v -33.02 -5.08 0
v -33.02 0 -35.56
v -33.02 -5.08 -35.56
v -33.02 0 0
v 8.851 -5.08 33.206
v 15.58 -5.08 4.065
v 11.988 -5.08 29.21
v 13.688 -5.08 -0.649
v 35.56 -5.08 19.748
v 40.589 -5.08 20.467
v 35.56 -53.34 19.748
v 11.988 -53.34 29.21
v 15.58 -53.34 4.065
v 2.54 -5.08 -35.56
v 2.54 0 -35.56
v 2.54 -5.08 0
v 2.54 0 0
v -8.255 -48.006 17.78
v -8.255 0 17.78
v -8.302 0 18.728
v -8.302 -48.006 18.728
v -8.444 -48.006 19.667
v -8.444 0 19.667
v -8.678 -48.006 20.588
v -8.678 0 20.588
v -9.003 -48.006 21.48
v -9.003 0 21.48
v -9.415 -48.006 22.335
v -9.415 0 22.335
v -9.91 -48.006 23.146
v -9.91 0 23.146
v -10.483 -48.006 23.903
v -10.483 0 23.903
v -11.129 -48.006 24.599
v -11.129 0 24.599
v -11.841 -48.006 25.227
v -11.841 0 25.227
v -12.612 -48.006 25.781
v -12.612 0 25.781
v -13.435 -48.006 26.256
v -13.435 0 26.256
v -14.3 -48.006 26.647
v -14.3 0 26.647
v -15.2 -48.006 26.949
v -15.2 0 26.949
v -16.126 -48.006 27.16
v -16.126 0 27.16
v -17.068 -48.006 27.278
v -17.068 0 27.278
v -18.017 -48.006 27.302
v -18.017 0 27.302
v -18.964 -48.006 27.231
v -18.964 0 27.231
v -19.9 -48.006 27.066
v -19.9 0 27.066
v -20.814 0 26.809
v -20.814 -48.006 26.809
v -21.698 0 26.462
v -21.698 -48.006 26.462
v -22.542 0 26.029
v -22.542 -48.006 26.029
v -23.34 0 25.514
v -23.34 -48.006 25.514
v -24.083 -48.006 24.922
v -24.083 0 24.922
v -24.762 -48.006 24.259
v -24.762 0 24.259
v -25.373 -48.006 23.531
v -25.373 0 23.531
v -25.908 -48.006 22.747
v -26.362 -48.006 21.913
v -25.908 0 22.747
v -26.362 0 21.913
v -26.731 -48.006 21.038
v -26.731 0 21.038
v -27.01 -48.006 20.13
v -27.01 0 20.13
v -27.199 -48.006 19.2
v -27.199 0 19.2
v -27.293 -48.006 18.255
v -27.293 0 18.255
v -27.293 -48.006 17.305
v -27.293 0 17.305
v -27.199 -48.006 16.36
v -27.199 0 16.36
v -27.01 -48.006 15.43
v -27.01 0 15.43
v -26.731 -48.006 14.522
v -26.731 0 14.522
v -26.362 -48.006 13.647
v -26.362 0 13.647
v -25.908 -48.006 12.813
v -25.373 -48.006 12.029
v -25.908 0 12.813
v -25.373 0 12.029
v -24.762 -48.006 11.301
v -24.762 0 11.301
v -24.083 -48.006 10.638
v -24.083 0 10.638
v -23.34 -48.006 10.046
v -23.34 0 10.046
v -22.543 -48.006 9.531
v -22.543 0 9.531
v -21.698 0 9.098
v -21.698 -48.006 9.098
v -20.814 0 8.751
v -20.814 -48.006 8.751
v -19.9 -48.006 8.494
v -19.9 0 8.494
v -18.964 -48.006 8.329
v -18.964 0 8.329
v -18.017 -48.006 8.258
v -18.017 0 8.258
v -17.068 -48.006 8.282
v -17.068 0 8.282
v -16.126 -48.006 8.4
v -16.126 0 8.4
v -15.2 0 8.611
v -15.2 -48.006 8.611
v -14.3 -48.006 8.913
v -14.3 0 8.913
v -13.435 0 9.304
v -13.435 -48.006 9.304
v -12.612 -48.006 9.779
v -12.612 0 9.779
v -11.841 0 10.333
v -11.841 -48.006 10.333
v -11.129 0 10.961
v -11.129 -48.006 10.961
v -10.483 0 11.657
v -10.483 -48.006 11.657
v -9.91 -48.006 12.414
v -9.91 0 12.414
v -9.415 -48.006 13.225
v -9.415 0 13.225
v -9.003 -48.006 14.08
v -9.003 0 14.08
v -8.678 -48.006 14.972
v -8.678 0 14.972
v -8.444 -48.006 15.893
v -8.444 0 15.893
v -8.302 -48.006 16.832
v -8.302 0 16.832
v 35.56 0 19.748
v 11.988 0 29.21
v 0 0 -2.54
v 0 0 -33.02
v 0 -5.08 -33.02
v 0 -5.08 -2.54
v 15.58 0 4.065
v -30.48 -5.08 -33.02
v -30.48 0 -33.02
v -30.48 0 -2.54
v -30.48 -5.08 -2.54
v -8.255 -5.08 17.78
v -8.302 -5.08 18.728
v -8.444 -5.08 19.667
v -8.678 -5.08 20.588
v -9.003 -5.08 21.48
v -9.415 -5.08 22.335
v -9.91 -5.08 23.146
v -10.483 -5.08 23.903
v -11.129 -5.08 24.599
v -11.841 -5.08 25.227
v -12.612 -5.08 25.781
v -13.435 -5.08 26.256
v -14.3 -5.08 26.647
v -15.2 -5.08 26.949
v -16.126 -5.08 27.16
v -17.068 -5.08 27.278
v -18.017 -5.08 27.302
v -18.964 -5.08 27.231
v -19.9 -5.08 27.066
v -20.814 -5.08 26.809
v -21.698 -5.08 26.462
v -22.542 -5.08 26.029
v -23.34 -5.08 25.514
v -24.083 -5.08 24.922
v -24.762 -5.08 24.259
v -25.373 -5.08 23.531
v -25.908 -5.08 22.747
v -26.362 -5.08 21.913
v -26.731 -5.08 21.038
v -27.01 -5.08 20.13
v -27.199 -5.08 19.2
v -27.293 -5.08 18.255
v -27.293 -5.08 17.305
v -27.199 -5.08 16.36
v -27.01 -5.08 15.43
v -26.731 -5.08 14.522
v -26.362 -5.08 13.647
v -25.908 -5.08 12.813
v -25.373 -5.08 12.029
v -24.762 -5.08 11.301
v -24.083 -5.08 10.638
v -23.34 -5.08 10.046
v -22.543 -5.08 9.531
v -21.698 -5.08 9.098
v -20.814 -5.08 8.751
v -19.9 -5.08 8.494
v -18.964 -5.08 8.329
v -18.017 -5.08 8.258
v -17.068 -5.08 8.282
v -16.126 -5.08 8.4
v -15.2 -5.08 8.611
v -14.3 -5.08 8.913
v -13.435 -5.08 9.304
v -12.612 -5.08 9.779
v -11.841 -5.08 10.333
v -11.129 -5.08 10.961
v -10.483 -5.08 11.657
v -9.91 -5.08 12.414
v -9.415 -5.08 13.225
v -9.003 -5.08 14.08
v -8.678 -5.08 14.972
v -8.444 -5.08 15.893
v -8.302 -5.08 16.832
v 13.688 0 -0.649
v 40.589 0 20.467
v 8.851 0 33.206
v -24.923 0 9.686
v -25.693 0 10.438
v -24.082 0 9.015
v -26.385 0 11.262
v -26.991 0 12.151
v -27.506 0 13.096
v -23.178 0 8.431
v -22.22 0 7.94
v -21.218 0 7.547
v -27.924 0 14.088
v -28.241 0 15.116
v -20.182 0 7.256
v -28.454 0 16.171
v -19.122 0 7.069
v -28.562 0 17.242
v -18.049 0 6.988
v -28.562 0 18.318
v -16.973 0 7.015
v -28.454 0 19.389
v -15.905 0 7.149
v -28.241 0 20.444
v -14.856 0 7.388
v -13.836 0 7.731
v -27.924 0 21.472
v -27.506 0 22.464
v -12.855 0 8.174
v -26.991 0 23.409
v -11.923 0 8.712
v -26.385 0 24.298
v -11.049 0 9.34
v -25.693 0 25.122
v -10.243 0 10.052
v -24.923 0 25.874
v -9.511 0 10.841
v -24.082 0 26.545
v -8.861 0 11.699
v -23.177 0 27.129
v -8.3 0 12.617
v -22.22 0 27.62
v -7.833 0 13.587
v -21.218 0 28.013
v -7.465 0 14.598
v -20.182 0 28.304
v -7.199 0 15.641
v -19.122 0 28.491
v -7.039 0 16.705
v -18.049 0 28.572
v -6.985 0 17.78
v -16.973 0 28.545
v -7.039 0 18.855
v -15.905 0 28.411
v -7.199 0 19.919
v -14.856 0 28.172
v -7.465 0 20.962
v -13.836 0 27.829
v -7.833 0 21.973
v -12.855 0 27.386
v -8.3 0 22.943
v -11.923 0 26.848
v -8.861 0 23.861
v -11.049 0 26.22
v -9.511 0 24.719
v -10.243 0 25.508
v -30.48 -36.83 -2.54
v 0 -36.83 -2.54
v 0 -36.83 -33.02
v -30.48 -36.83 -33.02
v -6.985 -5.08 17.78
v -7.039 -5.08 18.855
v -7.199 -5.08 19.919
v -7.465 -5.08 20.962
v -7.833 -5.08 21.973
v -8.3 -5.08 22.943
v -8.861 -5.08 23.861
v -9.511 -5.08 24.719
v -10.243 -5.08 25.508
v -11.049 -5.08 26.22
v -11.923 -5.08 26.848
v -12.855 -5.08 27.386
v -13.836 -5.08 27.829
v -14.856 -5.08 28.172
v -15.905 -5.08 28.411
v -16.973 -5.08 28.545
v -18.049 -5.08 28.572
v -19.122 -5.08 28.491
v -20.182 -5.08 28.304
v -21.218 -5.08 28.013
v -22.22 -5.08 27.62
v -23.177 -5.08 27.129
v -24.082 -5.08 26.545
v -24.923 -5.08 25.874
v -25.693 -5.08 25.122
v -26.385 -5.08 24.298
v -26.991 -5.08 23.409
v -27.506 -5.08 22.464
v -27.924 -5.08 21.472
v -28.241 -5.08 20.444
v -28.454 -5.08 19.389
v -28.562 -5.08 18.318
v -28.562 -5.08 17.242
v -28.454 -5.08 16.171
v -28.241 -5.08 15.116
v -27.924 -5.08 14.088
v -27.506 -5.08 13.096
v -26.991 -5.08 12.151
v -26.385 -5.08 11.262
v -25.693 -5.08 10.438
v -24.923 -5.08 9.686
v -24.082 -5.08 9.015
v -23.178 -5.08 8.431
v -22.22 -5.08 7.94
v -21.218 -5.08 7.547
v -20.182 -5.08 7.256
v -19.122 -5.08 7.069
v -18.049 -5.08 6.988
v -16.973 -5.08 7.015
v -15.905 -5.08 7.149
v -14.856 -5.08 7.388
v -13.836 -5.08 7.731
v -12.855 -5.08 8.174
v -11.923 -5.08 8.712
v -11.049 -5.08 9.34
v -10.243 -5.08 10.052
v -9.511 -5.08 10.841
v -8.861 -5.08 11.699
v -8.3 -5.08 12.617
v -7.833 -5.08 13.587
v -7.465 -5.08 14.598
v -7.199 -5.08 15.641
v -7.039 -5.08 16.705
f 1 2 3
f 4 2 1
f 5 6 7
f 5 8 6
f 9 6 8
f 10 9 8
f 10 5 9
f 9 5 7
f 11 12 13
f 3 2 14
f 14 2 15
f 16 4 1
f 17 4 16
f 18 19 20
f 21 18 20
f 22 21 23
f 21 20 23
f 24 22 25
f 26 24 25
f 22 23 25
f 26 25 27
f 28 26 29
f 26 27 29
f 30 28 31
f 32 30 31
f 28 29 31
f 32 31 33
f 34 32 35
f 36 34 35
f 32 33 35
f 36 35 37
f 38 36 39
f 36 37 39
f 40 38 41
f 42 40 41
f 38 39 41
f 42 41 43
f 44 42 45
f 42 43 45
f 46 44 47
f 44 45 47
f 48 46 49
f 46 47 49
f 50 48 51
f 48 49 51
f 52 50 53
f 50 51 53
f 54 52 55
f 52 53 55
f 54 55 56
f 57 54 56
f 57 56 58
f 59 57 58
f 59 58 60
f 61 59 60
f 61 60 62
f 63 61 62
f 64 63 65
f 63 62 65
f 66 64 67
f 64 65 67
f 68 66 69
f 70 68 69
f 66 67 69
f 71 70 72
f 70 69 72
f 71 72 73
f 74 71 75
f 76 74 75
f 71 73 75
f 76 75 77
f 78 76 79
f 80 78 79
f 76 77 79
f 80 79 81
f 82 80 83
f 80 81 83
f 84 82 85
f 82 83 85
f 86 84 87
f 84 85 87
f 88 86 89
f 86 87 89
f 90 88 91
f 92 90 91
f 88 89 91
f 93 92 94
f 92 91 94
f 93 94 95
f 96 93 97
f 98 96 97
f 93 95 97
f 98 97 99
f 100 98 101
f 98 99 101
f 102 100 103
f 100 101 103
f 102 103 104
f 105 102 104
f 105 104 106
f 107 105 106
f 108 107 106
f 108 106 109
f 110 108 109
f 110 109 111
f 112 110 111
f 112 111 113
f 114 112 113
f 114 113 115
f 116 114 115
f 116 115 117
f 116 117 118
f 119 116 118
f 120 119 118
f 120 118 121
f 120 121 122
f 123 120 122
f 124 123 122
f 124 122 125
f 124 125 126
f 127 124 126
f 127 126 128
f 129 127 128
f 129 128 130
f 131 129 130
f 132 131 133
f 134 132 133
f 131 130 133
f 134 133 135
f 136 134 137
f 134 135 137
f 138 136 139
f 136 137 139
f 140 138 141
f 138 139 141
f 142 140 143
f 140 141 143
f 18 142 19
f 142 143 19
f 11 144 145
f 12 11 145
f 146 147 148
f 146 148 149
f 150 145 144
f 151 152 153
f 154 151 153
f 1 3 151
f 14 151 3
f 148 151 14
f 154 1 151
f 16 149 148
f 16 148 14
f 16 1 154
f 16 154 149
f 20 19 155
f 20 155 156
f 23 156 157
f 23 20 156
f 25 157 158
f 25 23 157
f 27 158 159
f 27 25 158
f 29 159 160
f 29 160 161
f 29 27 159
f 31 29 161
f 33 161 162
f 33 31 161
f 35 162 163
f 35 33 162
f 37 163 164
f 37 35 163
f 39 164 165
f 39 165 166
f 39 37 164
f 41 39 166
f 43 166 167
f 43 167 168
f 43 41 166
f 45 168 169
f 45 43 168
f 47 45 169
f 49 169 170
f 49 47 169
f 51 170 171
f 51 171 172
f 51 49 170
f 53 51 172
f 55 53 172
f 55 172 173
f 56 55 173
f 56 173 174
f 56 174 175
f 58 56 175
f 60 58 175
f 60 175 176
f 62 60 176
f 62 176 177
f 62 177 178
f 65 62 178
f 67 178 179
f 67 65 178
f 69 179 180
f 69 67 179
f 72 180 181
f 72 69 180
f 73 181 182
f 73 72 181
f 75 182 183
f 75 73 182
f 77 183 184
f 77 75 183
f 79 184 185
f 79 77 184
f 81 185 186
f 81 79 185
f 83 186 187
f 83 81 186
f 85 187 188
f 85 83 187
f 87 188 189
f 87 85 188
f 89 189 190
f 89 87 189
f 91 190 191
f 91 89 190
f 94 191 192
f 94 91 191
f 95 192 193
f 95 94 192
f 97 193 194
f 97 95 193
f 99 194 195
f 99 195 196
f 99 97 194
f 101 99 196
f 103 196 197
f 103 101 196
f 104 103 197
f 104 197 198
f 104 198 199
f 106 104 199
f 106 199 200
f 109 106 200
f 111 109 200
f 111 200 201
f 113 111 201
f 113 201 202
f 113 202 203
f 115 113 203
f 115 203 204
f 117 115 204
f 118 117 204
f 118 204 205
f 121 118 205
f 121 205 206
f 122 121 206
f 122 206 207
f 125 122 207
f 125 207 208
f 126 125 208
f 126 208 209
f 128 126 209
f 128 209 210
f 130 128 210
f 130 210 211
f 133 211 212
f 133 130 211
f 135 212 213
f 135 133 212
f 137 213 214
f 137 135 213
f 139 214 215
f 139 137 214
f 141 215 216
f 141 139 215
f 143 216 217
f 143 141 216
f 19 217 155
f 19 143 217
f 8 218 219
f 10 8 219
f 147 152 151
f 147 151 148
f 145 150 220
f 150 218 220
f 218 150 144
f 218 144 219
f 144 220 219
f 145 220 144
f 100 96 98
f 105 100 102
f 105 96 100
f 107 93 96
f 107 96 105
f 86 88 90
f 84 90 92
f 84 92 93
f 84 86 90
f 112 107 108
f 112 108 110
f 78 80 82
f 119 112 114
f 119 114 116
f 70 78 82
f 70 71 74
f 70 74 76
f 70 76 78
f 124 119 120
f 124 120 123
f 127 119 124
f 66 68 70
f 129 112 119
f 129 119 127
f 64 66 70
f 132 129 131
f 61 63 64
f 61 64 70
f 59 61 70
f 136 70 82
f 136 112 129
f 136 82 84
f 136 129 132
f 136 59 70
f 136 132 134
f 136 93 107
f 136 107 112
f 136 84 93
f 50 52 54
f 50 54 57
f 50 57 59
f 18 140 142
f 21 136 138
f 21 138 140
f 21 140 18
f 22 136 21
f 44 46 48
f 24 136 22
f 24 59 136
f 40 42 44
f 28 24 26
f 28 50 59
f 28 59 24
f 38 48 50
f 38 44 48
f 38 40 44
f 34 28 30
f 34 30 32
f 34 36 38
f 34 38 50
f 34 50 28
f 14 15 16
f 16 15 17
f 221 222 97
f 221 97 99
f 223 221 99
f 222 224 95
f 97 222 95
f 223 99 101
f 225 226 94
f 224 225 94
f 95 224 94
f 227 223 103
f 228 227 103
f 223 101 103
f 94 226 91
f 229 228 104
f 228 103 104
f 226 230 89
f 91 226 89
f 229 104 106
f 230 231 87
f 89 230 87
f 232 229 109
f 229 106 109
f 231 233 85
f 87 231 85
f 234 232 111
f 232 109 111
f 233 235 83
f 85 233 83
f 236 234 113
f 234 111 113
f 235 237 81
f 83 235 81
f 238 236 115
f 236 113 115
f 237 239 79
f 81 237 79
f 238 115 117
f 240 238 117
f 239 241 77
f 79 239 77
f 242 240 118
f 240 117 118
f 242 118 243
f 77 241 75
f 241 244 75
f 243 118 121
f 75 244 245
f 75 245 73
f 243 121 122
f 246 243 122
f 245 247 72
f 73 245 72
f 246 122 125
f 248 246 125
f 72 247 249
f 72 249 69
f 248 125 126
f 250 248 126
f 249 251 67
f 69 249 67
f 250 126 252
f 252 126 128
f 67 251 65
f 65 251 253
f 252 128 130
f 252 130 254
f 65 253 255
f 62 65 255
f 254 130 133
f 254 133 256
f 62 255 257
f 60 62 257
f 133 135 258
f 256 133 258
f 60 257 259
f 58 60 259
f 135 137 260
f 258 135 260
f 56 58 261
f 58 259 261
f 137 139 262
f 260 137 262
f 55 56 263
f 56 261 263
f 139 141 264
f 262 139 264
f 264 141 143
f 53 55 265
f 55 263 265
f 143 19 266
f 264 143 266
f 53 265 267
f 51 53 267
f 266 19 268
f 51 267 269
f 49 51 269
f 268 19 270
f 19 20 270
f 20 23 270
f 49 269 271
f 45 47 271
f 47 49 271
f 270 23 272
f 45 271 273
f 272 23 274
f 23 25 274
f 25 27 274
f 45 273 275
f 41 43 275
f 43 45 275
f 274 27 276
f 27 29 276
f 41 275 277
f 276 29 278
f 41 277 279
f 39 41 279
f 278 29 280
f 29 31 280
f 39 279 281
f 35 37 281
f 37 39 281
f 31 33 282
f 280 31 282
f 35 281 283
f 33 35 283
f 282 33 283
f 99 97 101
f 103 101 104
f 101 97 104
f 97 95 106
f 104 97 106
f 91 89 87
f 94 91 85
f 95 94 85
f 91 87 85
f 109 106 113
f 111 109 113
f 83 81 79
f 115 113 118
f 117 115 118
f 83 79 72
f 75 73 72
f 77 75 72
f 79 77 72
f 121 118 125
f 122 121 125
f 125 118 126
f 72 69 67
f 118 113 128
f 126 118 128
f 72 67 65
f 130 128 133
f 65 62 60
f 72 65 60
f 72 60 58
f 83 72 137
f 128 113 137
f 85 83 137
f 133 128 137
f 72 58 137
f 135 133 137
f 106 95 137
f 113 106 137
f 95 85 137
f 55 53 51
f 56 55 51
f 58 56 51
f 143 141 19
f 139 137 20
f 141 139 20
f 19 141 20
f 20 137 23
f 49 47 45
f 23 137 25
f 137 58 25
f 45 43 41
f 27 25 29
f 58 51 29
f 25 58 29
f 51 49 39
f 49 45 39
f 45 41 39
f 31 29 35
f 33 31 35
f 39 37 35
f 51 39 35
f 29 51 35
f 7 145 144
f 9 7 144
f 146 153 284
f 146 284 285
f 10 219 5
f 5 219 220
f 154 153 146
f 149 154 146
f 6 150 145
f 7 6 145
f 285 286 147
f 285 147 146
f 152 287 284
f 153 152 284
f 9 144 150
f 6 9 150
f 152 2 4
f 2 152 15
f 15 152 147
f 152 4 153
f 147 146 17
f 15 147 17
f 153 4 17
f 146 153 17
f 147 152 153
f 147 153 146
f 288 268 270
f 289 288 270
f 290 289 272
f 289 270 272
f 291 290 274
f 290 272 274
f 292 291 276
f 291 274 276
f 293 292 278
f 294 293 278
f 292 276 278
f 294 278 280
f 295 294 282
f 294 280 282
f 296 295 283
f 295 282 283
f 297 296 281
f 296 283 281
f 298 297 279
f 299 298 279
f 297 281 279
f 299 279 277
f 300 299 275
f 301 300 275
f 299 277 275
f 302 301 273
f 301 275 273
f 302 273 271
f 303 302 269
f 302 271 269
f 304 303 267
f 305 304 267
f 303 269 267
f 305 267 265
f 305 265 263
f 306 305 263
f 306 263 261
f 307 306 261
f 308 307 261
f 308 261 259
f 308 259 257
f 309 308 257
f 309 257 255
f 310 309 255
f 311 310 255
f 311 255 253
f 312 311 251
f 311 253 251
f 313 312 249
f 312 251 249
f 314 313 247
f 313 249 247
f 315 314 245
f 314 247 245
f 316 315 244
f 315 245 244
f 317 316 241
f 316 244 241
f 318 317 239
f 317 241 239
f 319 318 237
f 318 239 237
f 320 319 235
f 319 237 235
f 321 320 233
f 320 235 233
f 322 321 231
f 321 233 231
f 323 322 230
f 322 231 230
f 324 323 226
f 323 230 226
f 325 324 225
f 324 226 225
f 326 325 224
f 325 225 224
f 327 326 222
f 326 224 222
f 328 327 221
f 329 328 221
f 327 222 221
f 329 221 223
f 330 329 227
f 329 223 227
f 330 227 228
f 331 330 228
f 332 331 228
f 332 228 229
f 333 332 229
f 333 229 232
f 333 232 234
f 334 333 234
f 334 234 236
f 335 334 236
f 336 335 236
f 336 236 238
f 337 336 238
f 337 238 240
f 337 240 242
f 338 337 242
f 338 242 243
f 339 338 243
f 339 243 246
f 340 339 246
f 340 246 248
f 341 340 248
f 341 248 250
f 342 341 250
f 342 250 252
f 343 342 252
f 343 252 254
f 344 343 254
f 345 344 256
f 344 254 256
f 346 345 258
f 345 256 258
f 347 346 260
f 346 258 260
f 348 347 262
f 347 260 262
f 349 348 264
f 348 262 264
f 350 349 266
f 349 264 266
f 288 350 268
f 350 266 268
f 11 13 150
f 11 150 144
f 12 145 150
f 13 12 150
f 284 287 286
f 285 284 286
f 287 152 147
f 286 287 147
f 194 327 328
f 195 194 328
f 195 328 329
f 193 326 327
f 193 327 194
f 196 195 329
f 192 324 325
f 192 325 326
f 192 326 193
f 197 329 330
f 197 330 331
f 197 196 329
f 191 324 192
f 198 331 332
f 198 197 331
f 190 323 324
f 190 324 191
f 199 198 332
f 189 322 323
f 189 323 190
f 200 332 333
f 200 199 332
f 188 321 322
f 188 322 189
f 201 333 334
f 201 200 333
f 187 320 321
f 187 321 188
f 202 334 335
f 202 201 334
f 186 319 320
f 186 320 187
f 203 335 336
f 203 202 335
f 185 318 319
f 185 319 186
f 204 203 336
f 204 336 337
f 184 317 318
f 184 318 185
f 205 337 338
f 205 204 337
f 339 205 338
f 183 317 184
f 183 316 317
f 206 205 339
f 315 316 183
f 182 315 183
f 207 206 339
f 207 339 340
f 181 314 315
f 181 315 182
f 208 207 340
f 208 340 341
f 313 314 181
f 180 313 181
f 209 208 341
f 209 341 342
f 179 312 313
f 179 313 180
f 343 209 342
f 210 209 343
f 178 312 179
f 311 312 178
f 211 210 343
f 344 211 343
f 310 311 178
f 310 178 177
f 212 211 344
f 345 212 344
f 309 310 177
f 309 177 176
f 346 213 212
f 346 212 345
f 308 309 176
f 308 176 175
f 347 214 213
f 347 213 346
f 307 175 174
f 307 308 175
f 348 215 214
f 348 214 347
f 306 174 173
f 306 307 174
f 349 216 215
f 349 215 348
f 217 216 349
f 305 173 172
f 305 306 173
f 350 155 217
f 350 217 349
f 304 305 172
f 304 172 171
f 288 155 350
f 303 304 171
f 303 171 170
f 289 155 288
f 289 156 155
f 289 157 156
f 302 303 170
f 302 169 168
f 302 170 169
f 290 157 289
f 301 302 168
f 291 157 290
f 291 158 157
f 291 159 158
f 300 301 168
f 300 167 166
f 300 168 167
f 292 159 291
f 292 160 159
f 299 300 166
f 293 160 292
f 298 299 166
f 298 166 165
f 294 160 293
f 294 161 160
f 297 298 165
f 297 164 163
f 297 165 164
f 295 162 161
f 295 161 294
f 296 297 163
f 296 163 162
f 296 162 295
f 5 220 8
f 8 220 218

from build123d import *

# Parameters (mm, degrees)
F0_R     = 9.525
F1_DEPTH = 48.006
F0_W     = 30.48
F0_H     = 30.48
F2_DEPTH = 36.83
F3_DEPTH = 53.34
F0_R_2   = 10.795
F4_DEPTH = 5.08
F0_W_2   = 35.56
F0_H_2   = 35.56


# Not quite as in the source:
# - the program builds the solid bodies; features that only make, move or delete a surface that nothing else refers to are left out


with BuildPart() as f1:
    # F0 (on Front) → F1 (new body)
    with BuildSketch(Plane.XZ):
        with Locations((-17.78, 17.78)):
            Circle(F0_R)
    extrude(amount=F1_DEPTH)


with BuildPart() as f2:
    # F0 (on Front) → F2 (new body)
    with BuildSketch(Plane.XZ):
        with Locations((-15.24, -17.78)):
            Rectangle(F0_W, F0_H)
    extrude(amount=F2_DEPTH)


with BuildPart() as f3:
    # F0 (on Front) → F3 (new body)
    with BuildSketch(Plane.XZ):
        Polygon((35.56, 19.7484918216), (11.9879855975, 29.21), (15.5800863581, 4.0652826199), align=None)
    extrude(amount=F3_DEPTH)


with BuildPart() as f4:
    # F0 (on Front) → F4 (new body)
    with BuildSketch(Plane.XZ):
        with Locations((-17.78, 17.78)):
            Circle(F0_R_2)
        with Locations((-17.78, 17.78)):
            Circle(F0_R, mode=Mode.SUBTRACT)
    extrude(amount=F4_DEPTH)


with BuildPart() as f4b:
    # F0 (on Front) → F4, piece 2 (new body)
    with BuildSketch(Plane.XZ):
        with Locations((-15.24, -17.78)):
            Rectangle(F0_W_2, F0_H_2)
        with Locations((-15.24, -17.78)):
            Rectangle(F0_W, F0_H, mode=Mode.SUBTRACT)
    extrude(amount=F4_DEPTH)


with BuildPart() as f4c:
    # F0 (on Front) → F4, piece 3 (new body)
    with BuildSketch(Plane.XZ):
        Polygon((40.588943476, 20.4669119737), (8.8513437572, 33.2059827284), (13.6877847225, -0.6491202606), align=None)
        Polygon((15.5800863581, 4.0652826199), (11.9879855975, 29.21), (35.56, 19.7484918216), align=None, mode=Mode.SUBTRACT)
    extrude(amount=F4_DEPTH)


solid = Compound([f1.part, f2.part, f3.part, f4.part, f4b.part, f4c.part])
